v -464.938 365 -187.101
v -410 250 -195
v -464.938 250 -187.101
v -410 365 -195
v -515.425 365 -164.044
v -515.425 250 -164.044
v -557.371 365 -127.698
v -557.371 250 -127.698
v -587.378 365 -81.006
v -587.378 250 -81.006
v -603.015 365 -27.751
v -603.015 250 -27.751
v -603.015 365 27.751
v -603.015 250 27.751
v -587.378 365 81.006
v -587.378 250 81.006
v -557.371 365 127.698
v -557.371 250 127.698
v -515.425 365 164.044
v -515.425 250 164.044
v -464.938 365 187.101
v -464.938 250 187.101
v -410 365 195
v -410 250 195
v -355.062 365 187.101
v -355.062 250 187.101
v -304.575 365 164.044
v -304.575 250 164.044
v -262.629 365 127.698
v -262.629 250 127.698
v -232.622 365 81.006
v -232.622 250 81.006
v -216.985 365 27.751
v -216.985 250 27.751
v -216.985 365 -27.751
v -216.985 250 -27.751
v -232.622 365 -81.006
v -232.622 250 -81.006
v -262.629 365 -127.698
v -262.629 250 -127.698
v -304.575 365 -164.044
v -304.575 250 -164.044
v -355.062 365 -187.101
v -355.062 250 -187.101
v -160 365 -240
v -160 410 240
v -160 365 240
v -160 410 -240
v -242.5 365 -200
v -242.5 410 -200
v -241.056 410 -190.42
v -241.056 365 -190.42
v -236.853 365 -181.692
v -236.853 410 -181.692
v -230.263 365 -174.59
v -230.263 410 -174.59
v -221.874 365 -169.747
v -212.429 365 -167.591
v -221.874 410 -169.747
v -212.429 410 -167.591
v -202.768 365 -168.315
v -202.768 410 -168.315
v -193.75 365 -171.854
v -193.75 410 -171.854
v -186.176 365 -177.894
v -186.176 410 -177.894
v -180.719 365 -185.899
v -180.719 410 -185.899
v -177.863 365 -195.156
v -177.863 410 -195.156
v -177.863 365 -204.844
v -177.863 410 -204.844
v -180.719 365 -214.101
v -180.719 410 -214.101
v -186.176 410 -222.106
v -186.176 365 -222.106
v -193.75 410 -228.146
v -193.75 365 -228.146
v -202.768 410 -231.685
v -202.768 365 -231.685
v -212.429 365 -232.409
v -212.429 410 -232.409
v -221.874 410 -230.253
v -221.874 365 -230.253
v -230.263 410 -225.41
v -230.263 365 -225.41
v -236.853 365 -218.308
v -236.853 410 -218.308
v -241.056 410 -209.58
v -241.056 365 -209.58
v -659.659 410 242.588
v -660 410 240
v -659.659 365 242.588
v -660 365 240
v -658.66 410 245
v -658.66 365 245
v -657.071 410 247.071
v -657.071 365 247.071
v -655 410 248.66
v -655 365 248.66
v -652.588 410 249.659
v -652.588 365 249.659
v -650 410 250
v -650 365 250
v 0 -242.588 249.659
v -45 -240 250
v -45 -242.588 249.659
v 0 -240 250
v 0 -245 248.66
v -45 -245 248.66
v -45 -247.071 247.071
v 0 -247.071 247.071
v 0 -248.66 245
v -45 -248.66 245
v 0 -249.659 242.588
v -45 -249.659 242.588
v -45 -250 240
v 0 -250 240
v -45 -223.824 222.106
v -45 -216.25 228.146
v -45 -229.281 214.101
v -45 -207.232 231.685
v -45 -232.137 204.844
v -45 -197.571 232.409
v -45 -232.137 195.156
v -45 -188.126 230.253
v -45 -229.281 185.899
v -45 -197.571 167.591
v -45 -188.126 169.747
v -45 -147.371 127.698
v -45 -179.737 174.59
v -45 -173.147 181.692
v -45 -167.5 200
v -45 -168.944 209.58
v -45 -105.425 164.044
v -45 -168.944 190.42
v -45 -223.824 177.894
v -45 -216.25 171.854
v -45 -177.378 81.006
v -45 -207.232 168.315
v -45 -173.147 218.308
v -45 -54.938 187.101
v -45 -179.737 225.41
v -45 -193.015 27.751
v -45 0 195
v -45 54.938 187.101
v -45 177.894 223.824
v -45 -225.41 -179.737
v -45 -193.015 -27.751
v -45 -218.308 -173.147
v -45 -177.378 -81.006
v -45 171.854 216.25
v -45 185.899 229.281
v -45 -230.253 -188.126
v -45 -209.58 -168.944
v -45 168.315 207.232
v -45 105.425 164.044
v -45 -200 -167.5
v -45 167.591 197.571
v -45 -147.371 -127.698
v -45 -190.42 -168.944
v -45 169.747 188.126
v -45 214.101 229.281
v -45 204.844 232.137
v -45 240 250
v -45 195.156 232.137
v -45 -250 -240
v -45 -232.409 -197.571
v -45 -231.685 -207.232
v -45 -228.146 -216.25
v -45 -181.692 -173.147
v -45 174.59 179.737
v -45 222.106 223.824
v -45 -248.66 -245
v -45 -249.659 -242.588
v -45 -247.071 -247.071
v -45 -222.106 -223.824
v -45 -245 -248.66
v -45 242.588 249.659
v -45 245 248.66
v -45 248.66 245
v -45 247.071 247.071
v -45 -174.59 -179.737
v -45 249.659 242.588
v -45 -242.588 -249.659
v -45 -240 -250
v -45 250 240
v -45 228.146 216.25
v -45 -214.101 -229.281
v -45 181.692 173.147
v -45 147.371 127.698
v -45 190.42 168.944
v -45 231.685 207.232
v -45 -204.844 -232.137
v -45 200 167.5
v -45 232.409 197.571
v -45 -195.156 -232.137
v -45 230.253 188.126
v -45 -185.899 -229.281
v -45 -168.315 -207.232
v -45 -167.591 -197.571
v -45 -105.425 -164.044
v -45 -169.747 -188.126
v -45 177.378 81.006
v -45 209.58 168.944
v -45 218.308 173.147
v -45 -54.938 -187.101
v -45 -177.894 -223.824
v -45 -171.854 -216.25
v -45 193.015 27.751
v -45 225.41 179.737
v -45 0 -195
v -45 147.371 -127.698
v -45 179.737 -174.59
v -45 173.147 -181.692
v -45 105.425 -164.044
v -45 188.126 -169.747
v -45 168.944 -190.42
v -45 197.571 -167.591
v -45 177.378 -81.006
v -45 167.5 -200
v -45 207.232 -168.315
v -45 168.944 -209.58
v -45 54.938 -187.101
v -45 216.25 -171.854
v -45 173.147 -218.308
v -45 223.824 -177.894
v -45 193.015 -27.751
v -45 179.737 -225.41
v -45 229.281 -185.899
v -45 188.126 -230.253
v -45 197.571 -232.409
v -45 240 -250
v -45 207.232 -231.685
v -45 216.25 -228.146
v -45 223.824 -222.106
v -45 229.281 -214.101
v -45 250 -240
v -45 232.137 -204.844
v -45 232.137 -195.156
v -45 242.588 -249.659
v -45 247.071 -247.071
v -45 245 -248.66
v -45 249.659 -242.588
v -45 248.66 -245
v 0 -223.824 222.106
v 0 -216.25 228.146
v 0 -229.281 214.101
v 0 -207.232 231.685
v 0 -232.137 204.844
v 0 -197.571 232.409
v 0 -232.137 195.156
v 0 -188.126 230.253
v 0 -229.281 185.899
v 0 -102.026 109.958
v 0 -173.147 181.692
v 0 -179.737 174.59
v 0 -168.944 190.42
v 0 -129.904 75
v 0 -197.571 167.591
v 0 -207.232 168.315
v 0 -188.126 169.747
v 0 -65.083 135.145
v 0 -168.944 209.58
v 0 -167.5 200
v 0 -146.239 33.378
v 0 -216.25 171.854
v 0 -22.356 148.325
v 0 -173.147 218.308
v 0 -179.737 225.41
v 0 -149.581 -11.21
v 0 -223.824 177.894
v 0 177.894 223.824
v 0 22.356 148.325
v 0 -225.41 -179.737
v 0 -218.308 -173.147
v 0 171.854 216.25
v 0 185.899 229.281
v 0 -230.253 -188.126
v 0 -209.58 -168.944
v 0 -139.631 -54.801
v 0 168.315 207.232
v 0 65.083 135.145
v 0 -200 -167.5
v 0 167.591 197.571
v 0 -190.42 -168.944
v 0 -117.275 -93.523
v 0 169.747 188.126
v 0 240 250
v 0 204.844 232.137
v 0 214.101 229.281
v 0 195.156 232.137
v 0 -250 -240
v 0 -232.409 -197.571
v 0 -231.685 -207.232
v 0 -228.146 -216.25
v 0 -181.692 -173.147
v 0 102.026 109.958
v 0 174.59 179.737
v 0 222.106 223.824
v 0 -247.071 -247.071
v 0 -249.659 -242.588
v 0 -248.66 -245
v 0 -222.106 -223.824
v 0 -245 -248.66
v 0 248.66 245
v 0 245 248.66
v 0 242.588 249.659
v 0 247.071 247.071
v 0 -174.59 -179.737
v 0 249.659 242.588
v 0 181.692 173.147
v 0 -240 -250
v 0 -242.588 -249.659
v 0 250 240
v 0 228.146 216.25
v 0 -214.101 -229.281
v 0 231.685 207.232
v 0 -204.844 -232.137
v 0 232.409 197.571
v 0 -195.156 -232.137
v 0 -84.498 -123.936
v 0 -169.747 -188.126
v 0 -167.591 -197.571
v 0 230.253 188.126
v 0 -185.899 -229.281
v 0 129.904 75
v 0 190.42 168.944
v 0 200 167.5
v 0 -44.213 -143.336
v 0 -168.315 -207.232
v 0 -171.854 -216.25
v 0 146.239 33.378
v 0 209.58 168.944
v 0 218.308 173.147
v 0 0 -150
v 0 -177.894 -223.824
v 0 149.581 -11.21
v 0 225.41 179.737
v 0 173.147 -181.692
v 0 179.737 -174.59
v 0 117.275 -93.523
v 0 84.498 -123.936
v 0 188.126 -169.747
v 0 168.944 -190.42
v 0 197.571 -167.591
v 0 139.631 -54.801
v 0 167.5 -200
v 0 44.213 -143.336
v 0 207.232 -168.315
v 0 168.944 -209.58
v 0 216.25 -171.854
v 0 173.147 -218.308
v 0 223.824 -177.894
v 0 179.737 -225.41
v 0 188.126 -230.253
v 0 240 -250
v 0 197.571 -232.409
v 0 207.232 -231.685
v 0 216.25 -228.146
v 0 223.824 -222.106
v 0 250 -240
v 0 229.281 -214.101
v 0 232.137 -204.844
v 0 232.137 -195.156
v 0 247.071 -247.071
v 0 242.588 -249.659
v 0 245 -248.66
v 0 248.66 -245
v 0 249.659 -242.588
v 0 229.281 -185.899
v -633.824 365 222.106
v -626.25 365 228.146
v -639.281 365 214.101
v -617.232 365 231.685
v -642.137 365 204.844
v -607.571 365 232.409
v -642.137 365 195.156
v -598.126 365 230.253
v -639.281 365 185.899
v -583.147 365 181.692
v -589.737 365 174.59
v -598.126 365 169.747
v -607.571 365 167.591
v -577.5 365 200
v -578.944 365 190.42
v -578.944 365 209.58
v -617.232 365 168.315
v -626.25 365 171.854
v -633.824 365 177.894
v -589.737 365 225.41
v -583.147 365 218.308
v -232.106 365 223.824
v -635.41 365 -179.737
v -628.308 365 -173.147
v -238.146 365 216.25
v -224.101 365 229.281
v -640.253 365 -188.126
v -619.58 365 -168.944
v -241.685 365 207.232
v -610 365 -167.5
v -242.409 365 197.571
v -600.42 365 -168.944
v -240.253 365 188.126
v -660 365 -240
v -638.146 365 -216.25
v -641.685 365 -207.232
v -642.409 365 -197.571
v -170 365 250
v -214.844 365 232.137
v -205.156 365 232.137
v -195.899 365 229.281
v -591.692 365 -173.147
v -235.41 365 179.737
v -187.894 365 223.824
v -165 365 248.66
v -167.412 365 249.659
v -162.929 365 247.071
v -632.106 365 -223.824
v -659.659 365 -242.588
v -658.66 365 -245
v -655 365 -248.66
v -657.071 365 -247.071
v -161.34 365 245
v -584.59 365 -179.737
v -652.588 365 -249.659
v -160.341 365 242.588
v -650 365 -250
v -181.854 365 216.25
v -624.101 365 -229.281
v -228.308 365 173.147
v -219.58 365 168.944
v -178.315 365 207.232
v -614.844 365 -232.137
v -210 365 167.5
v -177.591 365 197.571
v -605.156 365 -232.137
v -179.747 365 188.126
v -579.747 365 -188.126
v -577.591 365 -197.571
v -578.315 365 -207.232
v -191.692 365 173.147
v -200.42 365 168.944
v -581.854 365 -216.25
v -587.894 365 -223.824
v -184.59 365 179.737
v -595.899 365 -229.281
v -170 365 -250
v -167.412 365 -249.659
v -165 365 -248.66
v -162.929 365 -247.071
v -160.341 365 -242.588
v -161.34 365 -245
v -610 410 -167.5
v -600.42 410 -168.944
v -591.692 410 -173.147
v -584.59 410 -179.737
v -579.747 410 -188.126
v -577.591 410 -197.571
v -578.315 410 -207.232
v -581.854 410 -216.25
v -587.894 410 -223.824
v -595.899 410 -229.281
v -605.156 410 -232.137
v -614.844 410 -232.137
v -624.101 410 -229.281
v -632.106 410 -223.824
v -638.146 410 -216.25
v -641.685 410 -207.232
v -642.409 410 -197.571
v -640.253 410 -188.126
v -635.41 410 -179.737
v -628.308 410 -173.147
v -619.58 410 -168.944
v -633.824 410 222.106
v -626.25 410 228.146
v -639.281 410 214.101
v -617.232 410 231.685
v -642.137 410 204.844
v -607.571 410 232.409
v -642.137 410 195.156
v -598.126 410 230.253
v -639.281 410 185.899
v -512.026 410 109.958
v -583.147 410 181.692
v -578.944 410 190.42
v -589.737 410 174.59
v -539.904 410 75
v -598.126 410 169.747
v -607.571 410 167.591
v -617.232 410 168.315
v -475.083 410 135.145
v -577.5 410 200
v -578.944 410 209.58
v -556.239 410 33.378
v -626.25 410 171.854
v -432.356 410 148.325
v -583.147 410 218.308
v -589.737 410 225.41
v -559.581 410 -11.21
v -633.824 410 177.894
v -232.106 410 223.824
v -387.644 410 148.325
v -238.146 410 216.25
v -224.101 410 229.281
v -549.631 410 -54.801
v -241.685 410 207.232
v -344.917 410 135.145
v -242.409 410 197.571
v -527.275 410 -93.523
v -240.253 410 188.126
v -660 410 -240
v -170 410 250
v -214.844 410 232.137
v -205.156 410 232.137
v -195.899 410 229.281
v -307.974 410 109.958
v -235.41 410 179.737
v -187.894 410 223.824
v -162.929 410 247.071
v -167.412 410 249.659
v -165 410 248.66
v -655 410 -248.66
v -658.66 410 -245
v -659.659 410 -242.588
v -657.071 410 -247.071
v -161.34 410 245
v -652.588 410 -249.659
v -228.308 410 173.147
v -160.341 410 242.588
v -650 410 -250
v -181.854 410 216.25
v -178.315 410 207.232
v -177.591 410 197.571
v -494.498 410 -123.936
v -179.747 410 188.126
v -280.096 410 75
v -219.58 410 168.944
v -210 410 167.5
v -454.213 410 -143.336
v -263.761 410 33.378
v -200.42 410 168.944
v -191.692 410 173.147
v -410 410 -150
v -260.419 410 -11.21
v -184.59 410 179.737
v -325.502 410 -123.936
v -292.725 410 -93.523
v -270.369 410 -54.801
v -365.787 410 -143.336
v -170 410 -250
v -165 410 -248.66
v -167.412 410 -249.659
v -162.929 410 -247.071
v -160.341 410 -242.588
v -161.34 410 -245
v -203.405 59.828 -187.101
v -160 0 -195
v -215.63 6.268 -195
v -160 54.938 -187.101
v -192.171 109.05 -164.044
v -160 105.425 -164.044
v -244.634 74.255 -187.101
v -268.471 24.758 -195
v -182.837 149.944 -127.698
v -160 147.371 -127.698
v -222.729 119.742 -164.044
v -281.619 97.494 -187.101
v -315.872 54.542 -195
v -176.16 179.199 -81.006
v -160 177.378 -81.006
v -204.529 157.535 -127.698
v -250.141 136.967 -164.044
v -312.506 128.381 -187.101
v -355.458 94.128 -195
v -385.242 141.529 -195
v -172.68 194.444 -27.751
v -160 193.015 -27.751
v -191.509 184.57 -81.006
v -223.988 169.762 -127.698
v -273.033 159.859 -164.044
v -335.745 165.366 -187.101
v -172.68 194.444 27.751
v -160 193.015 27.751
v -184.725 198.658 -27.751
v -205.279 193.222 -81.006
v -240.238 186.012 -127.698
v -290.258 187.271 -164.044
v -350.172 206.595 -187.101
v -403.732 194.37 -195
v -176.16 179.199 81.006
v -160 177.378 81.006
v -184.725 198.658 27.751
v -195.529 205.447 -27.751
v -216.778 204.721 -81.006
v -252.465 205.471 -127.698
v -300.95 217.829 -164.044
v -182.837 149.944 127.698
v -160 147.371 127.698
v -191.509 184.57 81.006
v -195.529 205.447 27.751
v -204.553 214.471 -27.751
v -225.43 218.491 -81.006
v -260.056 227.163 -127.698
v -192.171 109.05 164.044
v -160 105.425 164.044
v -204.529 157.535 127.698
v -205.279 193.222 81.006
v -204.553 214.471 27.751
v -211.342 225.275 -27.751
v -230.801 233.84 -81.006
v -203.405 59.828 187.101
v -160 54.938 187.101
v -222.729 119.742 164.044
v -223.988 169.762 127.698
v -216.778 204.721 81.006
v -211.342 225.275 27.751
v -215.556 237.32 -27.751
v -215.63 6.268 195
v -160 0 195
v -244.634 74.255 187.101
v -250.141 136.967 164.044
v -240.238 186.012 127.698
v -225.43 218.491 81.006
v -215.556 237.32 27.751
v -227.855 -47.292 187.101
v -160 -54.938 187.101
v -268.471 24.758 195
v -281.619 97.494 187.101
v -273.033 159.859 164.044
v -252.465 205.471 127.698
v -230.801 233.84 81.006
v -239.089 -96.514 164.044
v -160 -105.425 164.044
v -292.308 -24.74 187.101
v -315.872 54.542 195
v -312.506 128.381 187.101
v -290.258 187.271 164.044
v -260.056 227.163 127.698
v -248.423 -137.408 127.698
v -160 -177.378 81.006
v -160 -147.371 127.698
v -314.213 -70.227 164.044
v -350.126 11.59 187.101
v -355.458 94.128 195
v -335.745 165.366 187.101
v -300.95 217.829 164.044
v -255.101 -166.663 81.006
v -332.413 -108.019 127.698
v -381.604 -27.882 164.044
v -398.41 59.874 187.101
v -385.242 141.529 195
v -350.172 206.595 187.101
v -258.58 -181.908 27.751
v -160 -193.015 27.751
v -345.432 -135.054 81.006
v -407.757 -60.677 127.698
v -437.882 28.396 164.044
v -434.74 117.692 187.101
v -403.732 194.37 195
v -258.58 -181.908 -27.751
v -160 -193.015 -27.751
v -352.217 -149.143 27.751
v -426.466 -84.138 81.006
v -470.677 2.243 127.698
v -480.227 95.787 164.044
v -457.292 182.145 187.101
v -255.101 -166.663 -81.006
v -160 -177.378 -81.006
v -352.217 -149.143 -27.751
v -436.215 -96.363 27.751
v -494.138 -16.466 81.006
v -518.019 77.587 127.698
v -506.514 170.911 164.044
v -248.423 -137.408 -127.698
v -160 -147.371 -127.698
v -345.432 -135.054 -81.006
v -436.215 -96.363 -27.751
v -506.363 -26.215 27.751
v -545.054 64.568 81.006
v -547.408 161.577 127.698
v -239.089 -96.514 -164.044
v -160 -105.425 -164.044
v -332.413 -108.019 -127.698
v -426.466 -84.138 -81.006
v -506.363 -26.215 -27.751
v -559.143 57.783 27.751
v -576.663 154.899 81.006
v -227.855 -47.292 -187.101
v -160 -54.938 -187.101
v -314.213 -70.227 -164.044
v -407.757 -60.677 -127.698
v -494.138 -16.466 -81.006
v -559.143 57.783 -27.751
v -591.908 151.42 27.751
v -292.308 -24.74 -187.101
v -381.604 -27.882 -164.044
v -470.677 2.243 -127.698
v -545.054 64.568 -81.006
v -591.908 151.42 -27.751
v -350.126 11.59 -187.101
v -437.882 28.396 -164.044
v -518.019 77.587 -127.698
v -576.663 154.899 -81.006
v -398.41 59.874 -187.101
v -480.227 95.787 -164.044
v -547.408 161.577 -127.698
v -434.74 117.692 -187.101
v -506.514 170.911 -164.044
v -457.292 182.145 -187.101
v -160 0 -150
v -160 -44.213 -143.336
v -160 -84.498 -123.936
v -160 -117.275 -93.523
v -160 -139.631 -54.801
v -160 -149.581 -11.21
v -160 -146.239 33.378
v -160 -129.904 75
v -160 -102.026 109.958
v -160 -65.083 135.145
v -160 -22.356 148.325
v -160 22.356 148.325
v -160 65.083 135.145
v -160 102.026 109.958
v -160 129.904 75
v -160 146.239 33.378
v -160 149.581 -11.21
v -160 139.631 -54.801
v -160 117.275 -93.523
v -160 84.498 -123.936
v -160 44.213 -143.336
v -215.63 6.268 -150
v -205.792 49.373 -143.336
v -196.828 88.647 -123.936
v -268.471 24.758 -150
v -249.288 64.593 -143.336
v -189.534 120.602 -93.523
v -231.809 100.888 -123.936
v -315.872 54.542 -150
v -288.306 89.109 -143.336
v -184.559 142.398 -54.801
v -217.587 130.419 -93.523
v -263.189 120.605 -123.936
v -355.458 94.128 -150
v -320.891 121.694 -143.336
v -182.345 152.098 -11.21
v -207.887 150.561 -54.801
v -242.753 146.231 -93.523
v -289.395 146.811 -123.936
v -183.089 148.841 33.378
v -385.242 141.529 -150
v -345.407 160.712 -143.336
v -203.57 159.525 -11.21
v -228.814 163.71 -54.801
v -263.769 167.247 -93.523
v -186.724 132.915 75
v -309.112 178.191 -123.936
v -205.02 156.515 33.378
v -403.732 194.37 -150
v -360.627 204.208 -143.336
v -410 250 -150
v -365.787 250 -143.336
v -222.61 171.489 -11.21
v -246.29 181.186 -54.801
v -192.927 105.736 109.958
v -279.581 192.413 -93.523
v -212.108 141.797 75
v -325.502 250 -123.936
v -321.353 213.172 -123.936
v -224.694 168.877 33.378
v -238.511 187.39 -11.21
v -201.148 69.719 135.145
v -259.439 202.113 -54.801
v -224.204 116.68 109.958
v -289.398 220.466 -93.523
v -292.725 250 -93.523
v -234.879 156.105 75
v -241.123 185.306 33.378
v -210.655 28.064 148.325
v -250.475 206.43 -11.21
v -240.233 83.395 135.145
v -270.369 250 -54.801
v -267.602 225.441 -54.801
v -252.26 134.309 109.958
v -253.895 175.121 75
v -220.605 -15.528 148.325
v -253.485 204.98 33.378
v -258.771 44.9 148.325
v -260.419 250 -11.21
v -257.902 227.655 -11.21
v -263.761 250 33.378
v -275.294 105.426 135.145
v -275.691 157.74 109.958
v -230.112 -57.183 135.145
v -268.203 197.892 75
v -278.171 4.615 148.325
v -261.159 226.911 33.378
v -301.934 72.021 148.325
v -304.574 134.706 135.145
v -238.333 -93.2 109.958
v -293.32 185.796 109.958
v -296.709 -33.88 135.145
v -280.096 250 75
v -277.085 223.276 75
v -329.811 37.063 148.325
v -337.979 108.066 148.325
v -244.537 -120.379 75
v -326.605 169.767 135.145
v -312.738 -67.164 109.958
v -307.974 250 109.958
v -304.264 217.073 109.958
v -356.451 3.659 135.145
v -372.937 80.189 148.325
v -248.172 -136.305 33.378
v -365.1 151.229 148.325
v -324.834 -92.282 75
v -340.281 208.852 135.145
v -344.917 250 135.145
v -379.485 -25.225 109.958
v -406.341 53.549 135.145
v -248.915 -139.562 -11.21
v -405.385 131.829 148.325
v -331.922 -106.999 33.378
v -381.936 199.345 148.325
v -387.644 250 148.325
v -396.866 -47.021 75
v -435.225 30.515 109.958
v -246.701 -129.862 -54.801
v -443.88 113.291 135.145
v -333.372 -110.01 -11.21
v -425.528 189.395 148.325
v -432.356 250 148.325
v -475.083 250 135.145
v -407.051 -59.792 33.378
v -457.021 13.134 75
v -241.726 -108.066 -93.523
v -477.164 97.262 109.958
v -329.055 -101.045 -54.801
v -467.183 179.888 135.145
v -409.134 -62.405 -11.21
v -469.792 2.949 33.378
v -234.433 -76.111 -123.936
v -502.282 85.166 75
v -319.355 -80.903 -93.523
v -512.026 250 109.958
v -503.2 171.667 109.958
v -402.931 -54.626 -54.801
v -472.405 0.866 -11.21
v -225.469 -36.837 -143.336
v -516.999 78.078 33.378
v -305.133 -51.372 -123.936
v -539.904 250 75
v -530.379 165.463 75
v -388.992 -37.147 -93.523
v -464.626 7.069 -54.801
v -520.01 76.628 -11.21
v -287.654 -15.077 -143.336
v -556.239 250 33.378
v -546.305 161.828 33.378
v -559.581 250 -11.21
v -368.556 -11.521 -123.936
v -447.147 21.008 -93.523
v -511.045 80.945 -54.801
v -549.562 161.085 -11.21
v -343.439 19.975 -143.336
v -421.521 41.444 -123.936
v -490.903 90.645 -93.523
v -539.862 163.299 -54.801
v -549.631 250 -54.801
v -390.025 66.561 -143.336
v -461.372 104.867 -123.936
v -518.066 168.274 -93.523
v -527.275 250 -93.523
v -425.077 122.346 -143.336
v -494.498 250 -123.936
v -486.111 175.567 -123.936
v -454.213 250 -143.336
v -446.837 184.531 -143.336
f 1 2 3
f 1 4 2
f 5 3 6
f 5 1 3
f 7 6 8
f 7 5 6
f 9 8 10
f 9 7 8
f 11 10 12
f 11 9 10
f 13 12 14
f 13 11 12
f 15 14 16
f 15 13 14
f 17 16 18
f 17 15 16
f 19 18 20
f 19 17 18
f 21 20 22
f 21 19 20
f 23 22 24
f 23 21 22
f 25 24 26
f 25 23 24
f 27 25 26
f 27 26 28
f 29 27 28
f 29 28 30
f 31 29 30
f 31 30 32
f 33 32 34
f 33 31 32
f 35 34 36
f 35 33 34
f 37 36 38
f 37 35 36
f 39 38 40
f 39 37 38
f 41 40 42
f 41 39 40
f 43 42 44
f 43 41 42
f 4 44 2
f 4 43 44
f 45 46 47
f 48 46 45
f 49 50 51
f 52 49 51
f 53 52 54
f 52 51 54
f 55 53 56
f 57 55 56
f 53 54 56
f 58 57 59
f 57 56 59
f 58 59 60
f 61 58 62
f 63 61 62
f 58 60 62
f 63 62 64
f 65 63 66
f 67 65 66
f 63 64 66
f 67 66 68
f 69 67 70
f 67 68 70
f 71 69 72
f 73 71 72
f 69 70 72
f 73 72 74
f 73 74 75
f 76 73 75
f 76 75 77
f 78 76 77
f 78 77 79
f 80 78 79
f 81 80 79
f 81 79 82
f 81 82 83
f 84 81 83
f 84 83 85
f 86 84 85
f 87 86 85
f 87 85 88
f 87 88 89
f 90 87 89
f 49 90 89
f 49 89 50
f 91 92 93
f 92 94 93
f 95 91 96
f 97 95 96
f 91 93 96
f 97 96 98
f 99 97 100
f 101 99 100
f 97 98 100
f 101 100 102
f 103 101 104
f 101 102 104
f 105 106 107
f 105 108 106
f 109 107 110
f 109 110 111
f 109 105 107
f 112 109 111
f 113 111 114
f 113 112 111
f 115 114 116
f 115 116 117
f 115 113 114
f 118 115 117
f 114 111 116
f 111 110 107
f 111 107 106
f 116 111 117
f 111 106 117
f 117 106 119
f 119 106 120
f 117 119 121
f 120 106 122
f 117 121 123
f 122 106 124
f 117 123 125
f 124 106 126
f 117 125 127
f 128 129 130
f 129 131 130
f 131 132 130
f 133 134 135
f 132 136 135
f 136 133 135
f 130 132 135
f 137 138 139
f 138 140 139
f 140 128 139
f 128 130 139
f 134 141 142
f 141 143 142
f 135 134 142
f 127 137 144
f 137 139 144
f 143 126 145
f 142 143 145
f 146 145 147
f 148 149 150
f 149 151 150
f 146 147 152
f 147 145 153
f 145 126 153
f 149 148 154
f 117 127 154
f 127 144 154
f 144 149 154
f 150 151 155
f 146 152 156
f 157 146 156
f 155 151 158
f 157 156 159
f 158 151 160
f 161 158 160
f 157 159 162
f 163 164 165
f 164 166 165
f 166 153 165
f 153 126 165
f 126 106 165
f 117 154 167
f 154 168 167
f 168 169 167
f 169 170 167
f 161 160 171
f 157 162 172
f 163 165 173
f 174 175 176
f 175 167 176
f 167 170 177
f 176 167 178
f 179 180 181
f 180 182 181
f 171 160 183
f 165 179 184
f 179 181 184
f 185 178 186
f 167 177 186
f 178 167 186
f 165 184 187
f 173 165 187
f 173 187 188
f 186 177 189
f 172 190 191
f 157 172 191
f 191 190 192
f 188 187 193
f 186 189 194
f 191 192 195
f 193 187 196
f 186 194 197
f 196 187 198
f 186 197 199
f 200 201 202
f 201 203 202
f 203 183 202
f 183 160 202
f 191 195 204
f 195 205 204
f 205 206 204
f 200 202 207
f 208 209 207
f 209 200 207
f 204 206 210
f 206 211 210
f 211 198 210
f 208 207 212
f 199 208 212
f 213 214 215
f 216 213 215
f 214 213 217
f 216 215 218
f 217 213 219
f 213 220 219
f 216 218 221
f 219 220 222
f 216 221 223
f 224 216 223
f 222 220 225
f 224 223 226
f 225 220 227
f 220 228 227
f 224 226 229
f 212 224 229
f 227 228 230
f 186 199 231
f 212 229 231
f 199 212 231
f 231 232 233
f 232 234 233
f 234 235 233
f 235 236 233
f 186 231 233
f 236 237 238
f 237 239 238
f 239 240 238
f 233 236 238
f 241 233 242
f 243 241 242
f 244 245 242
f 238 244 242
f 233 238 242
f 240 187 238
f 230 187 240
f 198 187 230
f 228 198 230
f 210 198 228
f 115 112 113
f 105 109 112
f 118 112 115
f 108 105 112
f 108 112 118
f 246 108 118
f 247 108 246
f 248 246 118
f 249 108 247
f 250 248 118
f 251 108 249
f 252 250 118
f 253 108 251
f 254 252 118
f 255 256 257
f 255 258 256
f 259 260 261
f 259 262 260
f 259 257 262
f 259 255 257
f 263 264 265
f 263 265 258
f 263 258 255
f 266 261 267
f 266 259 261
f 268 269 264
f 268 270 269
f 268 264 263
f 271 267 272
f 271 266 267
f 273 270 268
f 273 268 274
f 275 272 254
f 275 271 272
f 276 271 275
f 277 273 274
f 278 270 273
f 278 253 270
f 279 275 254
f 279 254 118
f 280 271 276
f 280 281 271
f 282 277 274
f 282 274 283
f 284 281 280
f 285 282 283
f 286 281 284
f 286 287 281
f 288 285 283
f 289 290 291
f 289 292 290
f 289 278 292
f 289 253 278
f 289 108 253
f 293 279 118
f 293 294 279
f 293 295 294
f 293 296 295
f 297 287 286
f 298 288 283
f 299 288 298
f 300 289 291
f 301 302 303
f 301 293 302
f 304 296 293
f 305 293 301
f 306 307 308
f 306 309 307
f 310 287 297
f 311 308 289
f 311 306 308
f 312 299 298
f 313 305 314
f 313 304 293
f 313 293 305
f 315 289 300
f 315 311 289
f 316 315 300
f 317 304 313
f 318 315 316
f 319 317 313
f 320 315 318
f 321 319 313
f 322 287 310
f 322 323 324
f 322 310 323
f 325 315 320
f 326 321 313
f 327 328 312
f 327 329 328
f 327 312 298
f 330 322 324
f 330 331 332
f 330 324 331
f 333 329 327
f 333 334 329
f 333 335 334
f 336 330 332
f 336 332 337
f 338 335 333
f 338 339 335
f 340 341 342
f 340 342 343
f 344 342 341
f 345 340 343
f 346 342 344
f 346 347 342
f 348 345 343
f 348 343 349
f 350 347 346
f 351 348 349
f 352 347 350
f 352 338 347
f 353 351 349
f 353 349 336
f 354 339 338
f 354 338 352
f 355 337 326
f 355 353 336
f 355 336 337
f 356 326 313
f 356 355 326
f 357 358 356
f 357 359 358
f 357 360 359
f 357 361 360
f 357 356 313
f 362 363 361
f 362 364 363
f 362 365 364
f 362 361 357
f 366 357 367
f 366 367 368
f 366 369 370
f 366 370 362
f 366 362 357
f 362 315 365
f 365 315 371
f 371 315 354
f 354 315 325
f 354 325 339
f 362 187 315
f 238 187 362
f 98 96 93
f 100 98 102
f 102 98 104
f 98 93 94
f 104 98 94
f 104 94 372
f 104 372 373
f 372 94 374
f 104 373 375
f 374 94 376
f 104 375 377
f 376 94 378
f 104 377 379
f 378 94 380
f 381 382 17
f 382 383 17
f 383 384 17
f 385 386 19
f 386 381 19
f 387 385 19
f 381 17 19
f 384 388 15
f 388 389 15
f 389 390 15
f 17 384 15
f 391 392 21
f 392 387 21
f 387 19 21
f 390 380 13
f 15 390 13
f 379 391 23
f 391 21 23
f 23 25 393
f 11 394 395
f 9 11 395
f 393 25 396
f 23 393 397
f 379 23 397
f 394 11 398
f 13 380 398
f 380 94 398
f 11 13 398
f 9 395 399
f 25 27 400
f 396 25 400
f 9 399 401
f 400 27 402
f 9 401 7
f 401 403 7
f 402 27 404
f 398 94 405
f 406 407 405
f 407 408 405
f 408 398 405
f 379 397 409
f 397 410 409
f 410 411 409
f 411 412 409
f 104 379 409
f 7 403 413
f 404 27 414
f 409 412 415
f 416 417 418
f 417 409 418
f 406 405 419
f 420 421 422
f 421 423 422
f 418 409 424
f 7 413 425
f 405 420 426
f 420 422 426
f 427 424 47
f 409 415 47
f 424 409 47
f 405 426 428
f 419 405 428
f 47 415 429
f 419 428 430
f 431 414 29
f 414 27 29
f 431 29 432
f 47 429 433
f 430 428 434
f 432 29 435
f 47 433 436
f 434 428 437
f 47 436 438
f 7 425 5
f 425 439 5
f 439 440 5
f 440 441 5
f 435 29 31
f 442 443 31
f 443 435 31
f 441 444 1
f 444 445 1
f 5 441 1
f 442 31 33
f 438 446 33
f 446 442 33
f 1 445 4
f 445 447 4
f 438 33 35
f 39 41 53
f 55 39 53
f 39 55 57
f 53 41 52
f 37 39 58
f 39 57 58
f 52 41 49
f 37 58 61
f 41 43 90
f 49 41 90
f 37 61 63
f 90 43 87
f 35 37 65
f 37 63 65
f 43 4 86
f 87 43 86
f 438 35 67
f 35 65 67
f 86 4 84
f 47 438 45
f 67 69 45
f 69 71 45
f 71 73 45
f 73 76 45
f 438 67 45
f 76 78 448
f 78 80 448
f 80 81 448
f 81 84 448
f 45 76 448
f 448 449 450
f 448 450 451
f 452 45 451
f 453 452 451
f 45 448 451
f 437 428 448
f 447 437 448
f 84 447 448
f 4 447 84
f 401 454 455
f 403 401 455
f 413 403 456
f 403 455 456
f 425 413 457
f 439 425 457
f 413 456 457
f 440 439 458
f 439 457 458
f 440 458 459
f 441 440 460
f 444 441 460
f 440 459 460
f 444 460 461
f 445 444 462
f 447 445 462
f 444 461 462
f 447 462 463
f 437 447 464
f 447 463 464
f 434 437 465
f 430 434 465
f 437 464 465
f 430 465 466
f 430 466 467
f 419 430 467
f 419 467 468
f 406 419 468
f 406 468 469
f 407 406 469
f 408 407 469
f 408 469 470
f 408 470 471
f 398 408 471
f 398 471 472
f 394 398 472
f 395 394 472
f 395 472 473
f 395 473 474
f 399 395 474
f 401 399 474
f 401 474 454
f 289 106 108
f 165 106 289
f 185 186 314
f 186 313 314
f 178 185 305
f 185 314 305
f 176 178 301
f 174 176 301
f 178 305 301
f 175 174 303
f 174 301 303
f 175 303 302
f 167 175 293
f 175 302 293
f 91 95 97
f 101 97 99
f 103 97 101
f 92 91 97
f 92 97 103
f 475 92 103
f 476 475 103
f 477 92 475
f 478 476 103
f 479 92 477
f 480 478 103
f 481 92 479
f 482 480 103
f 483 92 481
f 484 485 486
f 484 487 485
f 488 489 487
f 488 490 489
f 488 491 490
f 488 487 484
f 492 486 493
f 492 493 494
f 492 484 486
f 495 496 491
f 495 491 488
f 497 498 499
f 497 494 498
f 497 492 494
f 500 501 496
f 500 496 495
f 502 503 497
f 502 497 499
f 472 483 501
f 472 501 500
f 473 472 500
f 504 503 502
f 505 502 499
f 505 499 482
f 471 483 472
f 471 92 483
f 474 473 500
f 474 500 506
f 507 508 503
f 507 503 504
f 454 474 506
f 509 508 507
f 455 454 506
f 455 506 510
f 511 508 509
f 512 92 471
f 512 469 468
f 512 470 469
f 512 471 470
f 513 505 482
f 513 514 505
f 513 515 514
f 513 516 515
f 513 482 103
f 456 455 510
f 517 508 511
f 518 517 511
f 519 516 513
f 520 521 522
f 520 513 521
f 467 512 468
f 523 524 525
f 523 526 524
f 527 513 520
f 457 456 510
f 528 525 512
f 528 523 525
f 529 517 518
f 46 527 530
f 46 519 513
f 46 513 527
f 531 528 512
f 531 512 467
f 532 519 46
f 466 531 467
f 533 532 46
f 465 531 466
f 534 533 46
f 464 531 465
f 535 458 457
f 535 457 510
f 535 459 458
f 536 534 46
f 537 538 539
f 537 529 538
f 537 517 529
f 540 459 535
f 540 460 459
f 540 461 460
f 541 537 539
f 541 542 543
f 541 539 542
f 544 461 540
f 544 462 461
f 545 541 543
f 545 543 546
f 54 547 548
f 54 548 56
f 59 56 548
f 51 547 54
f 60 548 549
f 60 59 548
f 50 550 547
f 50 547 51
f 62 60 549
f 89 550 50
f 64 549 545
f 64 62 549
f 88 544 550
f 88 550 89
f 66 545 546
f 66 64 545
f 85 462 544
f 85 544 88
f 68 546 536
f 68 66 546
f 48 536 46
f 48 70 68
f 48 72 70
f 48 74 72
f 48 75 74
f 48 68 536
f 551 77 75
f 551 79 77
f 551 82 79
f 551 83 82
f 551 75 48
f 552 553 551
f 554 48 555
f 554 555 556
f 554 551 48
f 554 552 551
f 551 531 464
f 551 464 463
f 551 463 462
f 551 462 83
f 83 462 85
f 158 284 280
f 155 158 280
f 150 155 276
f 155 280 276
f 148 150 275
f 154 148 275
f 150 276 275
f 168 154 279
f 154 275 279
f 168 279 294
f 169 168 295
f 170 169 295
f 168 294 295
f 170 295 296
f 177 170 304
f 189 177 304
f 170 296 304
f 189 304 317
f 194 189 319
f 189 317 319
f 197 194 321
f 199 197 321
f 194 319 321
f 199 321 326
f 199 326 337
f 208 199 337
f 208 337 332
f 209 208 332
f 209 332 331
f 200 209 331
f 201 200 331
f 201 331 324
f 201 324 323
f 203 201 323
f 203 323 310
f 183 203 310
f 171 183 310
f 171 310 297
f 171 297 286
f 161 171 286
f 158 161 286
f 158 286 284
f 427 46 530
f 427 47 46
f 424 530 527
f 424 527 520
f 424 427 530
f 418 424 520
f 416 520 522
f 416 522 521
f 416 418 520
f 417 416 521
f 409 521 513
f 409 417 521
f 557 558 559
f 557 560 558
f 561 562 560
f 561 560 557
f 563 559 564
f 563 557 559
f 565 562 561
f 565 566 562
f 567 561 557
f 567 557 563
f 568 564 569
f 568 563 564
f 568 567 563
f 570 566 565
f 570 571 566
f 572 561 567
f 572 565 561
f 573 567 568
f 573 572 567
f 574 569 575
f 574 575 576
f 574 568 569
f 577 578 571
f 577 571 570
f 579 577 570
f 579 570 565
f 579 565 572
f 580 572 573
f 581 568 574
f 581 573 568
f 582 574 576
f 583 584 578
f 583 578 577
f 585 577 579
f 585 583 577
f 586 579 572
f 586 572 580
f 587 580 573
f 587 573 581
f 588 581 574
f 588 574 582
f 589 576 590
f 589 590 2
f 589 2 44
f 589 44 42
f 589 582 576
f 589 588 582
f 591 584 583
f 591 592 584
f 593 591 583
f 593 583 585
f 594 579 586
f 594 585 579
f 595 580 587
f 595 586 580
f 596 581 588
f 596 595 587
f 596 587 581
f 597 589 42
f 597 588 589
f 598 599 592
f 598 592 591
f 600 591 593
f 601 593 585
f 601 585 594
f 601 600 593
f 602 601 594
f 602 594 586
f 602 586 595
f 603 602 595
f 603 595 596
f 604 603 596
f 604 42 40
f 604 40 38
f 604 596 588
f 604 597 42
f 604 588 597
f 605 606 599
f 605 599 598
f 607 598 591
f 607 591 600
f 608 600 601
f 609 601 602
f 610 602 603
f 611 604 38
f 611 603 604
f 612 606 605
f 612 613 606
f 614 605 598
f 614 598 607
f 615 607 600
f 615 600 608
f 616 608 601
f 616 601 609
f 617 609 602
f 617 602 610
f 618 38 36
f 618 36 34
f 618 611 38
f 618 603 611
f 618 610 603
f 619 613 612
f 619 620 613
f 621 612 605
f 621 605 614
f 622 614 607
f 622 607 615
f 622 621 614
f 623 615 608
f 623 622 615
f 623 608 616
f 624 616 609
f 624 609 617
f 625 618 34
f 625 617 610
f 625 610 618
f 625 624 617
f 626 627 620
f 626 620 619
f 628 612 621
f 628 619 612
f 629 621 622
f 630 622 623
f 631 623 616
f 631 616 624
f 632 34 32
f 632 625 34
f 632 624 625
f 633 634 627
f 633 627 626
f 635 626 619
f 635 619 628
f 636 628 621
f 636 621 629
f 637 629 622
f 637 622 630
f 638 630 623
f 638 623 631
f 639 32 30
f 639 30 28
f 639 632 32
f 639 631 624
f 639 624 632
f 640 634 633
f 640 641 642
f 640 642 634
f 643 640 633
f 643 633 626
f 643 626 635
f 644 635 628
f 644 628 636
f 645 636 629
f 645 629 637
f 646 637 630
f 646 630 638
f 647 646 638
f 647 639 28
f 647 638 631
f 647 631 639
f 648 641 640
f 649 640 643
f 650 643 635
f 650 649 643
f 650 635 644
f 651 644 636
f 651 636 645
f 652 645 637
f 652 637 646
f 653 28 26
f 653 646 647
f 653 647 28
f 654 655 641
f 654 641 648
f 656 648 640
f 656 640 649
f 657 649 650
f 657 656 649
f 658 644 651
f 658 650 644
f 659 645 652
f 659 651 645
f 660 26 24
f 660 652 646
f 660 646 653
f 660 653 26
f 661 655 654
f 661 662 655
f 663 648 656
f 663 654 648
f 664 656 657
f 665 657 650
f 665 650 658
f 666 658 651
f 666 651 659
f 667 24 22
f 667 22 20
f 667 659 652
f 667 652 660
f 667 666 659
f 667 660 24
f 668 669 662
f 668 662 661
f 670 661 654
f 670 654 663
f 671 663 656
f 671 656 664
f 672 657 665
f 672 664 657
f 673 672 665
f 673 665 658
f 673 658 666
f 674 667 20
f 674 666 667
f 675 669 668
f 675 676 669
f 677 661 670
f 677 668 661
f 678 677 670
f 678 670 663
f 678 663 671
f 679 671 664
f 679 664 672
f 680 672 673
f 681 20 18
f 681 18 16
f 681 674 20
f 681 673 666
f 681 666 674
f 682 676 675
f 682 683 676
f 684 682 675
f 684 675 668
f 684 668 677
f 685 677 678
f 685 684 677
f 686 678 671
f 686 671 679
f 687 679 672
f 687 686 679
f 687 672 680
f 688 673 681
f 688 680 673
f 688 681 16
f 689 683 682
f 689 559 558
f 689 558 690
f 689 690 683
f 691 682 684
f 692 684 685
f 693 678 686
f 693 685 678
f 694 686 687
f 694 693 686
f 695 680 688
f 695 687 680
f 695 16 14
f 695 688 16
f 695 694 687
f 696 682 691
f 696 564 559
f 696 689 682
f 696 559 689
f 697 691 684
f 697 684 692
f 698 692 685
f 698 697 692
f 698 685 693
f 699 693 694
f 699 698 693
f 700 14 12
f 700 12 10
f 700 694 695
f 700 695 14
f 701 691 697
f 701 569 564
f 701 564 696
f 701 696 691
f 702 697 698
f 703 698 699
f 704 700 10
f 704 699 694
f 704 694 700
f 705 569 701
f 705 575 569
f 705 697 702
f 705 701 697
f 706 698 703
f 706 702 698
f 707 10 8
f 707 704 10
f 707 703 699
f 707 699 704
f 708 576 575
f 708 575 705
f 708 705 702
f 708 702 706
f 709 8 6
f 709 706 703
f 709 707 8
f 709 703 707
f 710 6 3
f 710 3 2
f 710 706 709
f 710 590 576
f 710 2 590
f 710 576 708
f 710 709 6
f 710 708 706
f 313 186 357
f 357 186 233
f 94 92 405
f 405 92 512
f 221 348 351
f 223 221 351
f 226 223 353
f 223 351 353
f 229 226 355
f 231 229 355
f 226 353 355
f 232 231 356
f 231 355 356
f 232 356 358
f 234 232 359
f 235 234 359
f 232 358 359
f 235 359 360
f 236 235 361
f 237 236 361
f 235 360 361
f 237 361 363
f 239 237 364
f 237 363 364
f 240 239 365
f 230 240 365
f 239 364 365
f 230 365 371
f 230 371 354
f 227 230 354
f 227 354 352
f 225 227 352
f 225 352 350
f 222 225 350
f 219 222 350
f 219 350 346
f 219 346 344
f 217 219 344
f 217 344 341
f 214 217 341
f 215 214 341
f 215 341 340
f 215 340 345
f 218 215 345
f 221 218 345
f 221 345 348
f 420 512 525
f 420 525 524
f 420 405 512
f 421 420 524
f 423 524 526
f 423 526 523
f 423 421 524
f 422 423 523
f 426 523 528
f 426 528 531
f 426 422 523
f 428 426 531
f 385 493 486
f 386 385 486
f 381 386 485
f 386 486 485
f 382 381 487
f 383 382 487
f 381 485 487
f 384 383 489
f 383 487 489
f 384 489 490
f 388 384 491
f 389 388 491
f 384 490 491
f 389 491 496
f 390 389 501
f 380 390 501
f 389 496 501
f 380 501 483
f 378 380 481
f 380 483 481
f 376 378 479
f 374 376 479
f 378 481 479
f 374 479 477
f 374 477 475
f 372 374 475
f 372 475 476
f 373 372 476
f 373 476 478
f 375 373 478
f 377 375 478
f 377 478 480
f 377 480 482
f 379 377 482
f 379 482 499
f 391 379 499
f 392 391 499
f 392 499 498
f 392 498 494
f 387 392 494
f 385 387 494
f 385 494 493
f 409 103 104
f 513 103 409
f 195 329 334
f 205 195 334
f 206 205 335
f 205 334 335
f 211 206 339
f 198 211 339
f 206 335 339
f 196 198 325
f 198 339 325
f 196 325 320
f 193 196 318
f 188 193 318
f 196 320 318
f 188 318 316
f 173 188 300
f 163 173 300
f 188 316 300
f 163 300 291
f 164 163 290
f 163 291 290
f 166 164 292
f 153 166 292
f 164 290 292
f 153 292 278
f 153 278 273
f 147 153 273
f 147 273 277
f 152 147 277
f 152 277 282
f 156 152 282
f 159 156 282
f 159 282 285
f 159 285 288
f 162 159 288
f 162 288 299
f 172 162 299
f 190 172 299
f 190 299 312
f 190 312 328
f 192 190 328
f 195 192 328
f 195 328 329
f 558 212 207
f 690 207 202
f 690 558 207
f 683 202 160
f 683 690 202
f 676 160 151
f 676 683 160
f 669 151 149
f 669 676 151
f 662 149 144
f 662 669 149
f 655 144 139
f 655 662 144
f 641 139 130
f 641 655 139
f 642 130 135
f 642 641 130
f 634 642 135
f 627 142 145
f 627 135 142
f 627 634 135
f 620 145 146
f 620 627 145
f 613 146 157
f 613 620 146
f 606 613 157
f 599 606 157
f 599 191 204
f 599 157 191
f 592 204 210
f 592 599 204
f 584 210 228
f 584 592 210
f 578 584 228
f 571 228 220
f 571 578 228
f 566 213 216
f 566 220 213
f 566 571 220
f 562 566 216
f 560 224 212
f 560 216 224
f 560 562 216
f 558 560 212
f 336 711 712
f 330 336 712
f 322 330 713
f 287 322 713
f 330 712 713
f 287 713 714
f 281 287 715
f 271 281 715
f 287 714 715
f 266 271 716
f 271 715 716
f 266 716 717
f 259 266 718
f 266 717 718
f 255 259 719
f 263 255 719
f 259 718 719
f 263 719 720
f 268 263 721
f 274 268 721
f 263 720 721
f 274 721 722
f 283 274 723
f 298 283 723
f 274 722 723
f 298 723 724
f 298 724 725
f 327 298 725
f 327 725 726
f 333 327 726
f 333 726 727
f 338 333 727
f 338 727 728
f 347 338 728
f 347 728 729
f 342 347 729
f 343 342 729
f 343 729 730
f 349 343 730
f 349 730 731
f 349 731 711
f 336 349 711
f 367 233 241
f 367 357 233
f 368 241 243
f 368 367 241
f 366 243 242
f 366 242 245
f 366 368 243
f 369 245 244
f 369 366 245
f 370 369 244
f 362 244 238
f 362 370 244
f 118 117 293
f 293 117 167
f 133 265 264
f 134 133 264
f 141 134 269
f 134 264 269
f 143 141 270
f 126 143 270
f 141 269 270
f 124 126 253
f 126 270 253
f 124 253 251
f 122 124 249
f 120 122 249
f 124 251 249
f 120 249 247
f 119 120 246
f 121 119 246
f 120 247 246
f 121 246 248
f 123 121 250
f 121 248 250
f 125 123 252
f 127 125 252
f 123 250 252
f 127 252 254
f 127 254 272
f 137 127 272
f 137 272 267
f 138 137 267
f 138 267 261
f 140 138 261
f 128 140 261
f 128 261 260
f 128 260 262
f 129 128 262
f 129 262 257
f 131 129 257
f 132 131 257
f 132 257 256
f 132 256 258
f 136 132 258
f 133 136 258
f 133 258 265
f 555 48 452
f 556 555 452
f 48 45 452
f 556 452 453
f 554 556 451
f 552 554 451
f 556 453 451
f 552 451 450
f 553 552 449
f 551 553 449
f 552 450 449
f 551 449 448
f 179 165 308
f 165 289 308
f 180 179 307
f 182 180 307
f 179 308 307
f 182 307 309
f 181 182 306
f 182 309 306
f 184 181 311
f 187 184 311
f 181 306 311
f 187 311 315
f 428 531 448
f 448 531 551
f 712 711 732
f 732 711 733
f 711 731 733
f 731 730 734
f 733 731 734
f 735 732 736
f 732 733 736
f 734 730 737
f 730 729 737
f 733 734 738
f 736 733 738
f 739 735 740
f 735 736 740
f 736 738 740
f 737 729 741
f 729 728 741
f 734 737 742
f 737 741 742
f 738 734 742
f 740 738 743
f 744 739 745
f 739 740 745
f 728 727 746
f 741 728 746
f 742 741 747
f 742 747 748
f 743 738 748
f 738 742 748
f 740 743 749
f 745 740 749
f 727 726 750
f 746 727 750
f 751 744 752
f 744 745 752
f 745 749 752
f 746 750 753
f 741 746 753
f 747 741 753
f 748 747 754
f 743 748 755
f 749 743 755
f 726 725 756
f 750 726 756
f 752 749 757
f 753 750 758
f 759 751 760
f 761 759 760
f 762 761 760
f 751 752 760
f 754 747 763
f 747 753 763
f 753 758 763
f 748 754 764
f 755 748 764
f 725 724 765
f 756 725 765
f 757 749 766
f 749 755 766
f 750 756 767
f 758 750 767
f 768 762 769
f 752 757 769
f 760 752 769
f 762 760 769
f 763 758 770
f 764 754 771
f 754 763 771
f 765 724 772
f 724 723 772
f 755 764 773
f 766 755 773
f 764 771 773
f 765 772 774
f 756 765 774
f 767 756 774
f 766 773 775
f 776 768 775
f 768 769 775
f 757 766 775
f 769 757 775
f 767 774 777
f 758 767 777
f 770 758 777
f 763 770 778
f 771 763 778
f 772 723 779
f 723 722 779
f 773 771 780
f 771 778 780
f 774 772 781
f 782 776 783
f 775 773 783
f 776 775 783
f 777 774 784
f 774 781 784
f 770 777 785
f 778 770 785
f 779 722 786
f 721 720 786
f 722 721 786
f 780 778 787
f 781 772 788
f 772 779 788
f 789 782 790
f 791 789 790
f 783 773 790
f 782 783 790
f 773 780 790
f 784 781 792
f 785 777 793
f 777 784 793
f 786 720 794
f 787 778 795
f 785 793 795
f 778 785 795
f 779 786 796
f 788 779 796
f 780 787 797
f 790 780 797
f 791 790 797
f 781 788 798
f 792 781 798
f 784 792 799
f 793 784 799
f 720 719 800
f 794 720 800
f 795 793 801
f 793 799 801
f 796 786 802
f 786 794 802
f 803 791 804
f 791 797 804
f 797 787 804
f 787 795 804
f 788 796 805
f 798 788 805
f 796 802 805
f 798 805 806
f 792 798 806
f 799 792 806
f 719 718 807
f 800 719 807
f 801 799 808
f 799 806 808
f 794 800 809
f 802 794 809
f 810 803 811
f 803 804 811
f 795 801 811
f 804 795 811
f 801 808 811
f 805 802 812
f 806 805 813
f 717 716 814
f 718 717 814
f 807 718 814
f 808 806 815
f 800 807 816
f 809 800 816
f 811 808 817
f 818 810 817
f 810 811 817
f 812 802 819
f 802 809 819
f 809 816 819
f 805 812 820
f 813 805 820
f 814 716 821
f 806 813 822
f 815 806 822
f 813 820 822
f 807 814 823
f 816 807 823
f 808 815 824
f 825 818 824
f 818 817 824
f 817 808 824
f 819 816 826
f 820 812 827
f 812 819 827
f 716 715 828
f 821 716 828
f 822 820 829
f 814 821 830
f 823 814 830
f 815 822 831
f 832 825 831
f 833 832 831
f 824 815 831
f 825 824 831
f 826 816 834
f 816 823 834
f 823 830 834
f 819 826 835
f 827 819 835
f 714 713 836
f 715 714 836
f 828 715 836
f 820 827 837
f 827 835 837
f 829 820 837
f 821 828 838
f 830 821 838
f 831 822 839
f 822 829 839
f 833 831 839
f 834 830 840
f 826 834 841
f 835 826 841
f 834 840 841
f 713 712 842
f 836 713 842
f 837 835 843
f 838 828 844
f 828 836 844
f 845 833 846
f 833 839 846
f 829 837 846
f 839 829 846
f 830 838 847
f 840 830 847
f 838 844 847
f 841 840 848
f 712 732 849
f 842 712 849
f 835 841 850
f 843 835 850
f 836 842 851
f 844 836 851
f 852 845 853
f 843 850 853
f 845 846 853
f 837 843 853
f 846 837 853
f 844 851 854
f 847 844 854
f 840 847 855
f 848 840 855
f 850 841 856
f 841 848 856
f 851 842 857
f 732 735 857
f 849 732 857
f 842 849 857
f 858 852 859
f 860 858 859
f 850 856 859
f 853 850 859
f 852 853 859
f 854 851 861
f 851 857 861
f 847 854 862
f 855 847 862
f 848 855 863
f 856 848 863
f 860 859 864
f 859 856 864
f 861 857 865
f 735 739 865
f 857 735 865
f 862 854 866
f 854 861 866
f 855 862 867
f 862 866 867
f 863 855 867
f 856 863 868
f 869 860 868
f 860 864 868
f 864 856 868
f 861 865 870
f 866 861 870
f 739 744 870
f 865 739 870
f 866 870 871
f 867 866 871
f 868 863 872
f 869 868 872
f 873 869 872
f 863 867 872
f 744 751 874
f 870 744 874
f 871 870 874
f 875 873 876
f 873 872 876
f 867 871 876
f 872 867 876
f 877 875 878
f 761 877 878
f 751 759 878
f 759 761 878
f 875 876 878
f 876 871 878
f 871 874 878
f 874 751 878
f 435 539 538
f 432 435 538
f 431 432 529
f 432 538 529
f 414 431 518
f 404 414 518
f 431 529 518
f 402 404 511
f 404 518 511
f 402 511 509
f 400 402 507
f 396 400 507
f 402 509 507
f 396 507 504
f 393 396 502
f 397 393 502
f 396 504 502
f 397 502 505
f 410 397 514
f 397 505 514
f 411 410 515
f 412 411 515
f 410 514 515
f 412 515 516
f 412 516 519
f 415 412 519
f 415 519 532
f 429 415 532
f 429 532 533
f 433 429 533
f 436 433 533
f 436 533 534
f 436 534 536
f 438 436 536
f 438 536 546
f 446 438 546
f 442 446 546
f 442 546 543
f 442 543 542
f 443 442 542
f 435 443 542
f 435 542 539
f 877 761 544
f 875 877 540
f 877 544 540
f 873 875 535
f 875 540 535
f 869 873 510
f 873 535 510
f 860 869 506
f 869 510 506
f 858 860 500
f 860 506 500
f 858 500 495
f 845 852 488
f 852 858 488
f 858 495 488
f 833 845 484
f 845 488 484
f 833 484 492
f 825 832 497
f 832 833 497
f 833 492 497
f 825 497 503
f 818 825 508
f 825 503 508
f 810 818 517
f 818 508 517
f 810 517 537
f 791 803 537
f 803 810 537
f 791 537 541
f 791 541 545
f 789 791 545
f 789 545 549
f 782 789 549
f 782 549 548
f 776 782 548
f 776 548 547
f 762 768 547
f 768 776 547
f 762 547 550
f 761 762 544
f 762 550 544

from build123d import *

# Parameters (mm, degrees)
SKETCH3_R           = 195
SKETCH3_R_2         = 150
BOSS_EXTRUDE3_START = -45
SKETCH8_W           = 500
SKETCH8_H           = 500
SKETCH8_R           = 195
BOSS_EXTRUDE3_DEPTH = 45
FILLET3_R           = 10
SKETCH9_W           = 500
SKETCH9_H           = 500
SKETCH9_R           = 195
BOSS_EXTRUDE4_DEPTH = 45
FILLET4_R           = 10
CUT_EXTRUDE2_REACH  = 818.211
SKETCH10_R          = 32.5
CIRPATTERN2_COUNT   = 4
CUT_EXTRUDE3_REACH  = 968.282
SKETCH11_R          = 32.5
CIRPATTERN3_COUNT   = 4


with BuildPart() as part:
    # Sweep-Thin4: sweep along a path in Sketch2
    with BuildLine(Plane.XY) as sweep_thin4_path:
        Line((0, 0), (-160, 0))
        ThreePointArc((-160, 0), (-336.776695297, 73.223304703), (-410, 250))
        Line((-410, 250), (-410, 410))
    # Sketch3 → Sweep-Thin4 (sweep)
    with BuildSketch(Plane(origin=(0, 0, 0), x_dir=(0, 0, -1), z_dir=(1, 0, 0))):
        Circle(SKETCH3_R)
        Circle(SKETCH3_R_2, mode=Mode.SUBTRACT)
    sweep(path=sweep_thin4_path.line)

    # Sketch8 → Boss-Extrude3 (add)
    with BuildSketch(Plane(origin=(0, 0, 0), x_dir=(0, 0, -1), z_dir=(1, 0, 0)).offset(BOSS_EXTRUDE3_START)):
        Rectangle(SKETCH8_W, SKETCH8_H)
        with Locations(Location((0, 0, 0), (0, 0, 270))):
            Circle(SKETCH8_R, mode=Mode.SUBTRACT)
    extrude(amount=BOSS_EXTRUDE3_DEPTH)

    # Fillet3
    fillet3_edges = [part.edges().sort_by_distance(p)[0] for p in [
        (-22.5, 250, -250),
        (-22.5, -250, -250),
        (-22.5, -250, 250),
        (-22.5, 250, 250),
    ]]
    fillet(fillet3_edges, radius=FILLET3_R)

    # Sketch9 → Boss-Extrude4 (add)
    with BuildSketch(Plane(origin=(0, 410, 0), x_dir=(1, 0, 0), z_dir=(0, 1, 0))):
        with Locations((-410, 0)):
            Rectangle(SKETCH9_W, SKETCH9_H)
        with Locations(Location((-410, 0, 0), (0, 0, 270))):
            Circle(SKETCH9_R, mode=Mode.SUBTRACT)
    extrude(amount=-BOSS_EXTRUDE4_DEPTH)

    # Fillet4
    fillet4_edges = [part.edges().sort_by_distance(p)[0] for p in [
        (-660, 387.5, -250),
        (-160, 387.5, -250),
        (-160, 387.5, 250),
        (-660, 387.5, 250),
    ]]
    fillet(fillet4_edges, radius=FILLET4_R)

    # Sketch10 → Cut-Extrude2 (cut, up to next)
    with BuildSketch(Plane(origin=(0, 0, 0), x_dir=(0, 0, -1), z_dir=(1, 0, 0)), mode=Mode.PRIVATE) as cut_extrude2_sk1:
        with Locations((-200, 200)):
            Circle(SKETCH10_R)
    cut_extrude2_tool1 = extrude(cut_extrude2_sk1.sketch, amount=-CUT_EXTRUDE2_REACH, mode=Mode.PRIVATE) & part.part
    cut_extrude2 = cut_extrude2_tool1.solids().sort_by_distance((0, 200, 200))[0]
    add(cut_extrude2, mode=Mode.SUBTRACT)

    # CirPattern2: Cut-Extrude2 ×4 about axis
    cirpattern2_axis = Axis((0, 0, 0), (1, 0, 0))
    for i in range(1, CIRPATTERN2_COUNT):
        add(cut_extrude2.rotate(cirpattern2_axis, i * 360 / CIRPATTERN2_COUNT), mode=Mode.SUBTRACT)

    # Sketch11 → Cut-Extrude3 (cut, up to next)
    with BuildSketch(Plane(origin=(0, 410, 0), x_dir=(1, 0, 0), z_dir=(0, 1, 0)), mode=Mode.PRIVATE) as cut_extrude3_sk1:
        with Locations(Location((-610, 200, 0), (0, 0, 270))):
            Circle(SKETCH11_R)
    cut_extrude3_tool1 = extrude(cut_extrude3_sk1.sketch, amount=-CUT_EXTRUDE3_REACH, mode=Mode.PRIVATE) & part.part
    cut_extrude3 = cut_extrude3_tool1.solids().sort_by_distance((-610, 410, -200))[0]
    add(cut_extrude3, mode=Mode.SUBTRACT)

    # CirPattern3: Cut-Extrude3 ×4 about axis
    cirpattern3_axis = Axis((-410, 0, 0), (0, 1, 0))
    for i in range(1, CIRPATTERN3_COUNT):
        add(cut_extrude3.rotate(cirpattern3_axis, i * 360 / CIRPATTERN3_COUNT), mode=Mode.SUBTRACT)


solid = part.part
